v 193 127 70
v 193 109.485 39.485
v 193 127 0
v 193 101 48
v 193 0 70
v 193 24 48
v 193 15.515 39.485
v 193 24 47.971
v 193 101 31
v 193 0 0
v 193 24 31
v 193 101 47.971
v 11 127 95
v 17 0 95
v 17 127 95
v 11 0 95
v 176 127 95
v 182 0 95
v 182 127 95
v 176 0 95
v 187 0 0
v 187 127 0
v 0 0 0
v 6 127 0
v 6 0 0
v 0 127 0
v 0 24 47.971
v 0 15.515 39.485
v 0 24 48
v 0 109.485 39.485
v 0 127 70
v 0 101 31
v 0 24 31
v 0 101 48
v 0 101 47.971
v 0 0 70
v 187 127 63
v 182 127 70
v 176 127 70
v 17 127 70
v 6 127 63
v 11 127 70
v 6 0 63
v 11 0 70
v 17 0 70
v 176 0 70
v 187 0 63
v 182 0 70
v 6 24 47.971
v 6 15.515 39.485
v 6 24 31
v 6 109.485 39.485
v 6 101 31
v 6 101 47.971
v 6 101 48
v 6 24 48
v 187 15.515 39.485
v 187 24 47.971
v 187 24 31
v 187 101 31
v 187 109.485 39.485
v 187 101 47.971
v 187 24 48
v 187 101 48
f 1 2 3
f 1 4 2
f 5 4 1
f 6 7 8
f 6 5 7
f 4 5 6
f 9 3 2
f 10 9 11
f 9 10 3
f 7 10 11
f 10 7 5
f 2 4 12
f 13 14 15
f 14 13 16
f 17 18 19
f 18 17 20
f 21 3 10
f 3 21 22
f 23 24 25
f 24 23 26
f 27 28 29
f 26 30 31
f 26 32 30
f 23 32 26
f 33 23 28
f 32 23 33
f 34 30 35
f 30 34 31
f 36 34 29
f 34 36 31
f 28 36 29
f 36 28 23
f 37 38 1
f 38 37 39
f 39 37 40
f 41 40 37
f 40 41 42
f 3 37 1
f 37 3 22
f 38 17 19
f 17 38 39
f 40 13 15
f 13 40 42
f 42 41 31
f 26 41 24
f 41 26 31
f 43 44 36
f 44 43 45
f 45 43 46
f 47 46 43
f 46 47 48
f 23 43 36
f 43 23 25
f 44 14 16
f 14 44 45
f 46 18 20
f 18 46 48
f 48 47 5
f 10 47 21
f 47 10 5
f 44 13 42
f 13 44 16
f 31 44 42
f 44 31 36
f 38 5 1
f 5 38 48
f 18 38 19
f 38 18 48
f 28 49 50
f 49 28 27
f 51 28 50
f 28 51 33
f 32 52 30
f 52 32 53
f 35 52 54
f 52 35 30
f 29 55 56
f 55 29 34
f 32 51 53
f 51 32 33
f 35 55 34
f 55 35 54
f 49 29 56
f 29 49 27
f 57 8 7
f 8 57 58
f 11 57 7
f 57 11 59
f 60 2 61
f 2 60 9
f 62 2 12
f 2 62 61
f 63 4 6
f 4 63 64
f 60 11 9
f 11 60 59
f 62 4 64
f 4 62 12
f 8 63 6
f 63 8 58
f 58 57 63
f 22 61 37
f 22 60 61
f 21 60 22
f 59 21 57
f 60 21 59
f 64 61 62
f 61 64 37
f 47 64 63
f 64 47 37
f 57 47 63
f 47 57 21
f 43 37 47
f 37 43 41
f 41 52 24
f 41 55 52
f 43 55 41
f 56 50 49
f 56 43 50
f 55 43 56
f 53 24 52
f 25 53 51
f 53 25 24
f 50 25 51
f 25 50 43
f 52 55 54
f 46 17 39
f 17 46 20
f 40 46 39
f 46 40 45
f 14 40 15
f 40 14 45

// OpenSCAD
// Measurements in mm
PSU_WIDTH = 181;
PSU_HEIGHT = 64;

RADIO_WIDTH = 159;
RADIO_HEIGHT = 25;

WALL_THICKNESS = 6;
TOTAL_DEPTH = 127;
TOTAL_WIDTH = PSU_WIDTH + WALL_THICKNESS + WALL_THICKNESS;
TOTAL_HEIGHT = PSU_HEIGHT + WALL_THICKNESS + RADIO_HEIGHT;

RADIO_LEFT_OFFSET = ((PSU_WIDTH - RADIO_WIDTH) / 2) + WALL_THICKNESS;


module psu_vent_slots() {
    translate([-12, 24, 31])
        rotate([45, 0, 0])
            cube([24, 12, 12]);
    
    translate([-12, 101, 31])
        rotate([45, 0, 0])
            cube([24, 12, 12]);
    
    translate([-12, 24, 31])
        cube([24, 77, 17]);
}

difference() {
    // Main shape.
    difference() {
        cube([TOTAL_WIDTH, TOTAL_DEPTH, TOTAL_HEIGHT]);
        translate([-WALL_THICKNESS, -1, PSU_HEIGHT + WALL_THICKNESS])
            cube([RADIO_LEFT_OFFSET, TOTAL_DEPTH + 2, RADIO_HEIGHT + 1]);
        translate([TOTAL_WIDTH - RADIO_LEFT_OFFSET + WALL_THICKNESS, -1, PSU_HEIGHT + WALL_THICKNESS])
            cube([RADIO_LEFT_OFFSET, TOTAL_DEPTH + 2, RADIO_HEIGHT + 1]);
    }

    // Power supply slot.
    translate([WALL_THICKNESS, -1, -1])
        cube([PSU_WIDTH, TOTAL_DEPTH + 2, PSU_HEIGHT]);

    // Radio slot.
    translate([RADIO_LEFT_OFFSET, -1, PSU_HEIGHT + WALL_THICKNESS])
        cube([RADIO_WIDTH, TOTAL_DEPTH + 2, RADIO_HEIGHT + 1]);

    // Power supply ventilation slots.
    psu_vent_slots();
    translate([PSU_WIDTH + 1, 0, 0])
        psu_vent_slots();

    // Truncate to 1/2" thick.
    /*translate([-0.1, 0.5, -0.1])
        cube([10, 6, 10]);*/
}
